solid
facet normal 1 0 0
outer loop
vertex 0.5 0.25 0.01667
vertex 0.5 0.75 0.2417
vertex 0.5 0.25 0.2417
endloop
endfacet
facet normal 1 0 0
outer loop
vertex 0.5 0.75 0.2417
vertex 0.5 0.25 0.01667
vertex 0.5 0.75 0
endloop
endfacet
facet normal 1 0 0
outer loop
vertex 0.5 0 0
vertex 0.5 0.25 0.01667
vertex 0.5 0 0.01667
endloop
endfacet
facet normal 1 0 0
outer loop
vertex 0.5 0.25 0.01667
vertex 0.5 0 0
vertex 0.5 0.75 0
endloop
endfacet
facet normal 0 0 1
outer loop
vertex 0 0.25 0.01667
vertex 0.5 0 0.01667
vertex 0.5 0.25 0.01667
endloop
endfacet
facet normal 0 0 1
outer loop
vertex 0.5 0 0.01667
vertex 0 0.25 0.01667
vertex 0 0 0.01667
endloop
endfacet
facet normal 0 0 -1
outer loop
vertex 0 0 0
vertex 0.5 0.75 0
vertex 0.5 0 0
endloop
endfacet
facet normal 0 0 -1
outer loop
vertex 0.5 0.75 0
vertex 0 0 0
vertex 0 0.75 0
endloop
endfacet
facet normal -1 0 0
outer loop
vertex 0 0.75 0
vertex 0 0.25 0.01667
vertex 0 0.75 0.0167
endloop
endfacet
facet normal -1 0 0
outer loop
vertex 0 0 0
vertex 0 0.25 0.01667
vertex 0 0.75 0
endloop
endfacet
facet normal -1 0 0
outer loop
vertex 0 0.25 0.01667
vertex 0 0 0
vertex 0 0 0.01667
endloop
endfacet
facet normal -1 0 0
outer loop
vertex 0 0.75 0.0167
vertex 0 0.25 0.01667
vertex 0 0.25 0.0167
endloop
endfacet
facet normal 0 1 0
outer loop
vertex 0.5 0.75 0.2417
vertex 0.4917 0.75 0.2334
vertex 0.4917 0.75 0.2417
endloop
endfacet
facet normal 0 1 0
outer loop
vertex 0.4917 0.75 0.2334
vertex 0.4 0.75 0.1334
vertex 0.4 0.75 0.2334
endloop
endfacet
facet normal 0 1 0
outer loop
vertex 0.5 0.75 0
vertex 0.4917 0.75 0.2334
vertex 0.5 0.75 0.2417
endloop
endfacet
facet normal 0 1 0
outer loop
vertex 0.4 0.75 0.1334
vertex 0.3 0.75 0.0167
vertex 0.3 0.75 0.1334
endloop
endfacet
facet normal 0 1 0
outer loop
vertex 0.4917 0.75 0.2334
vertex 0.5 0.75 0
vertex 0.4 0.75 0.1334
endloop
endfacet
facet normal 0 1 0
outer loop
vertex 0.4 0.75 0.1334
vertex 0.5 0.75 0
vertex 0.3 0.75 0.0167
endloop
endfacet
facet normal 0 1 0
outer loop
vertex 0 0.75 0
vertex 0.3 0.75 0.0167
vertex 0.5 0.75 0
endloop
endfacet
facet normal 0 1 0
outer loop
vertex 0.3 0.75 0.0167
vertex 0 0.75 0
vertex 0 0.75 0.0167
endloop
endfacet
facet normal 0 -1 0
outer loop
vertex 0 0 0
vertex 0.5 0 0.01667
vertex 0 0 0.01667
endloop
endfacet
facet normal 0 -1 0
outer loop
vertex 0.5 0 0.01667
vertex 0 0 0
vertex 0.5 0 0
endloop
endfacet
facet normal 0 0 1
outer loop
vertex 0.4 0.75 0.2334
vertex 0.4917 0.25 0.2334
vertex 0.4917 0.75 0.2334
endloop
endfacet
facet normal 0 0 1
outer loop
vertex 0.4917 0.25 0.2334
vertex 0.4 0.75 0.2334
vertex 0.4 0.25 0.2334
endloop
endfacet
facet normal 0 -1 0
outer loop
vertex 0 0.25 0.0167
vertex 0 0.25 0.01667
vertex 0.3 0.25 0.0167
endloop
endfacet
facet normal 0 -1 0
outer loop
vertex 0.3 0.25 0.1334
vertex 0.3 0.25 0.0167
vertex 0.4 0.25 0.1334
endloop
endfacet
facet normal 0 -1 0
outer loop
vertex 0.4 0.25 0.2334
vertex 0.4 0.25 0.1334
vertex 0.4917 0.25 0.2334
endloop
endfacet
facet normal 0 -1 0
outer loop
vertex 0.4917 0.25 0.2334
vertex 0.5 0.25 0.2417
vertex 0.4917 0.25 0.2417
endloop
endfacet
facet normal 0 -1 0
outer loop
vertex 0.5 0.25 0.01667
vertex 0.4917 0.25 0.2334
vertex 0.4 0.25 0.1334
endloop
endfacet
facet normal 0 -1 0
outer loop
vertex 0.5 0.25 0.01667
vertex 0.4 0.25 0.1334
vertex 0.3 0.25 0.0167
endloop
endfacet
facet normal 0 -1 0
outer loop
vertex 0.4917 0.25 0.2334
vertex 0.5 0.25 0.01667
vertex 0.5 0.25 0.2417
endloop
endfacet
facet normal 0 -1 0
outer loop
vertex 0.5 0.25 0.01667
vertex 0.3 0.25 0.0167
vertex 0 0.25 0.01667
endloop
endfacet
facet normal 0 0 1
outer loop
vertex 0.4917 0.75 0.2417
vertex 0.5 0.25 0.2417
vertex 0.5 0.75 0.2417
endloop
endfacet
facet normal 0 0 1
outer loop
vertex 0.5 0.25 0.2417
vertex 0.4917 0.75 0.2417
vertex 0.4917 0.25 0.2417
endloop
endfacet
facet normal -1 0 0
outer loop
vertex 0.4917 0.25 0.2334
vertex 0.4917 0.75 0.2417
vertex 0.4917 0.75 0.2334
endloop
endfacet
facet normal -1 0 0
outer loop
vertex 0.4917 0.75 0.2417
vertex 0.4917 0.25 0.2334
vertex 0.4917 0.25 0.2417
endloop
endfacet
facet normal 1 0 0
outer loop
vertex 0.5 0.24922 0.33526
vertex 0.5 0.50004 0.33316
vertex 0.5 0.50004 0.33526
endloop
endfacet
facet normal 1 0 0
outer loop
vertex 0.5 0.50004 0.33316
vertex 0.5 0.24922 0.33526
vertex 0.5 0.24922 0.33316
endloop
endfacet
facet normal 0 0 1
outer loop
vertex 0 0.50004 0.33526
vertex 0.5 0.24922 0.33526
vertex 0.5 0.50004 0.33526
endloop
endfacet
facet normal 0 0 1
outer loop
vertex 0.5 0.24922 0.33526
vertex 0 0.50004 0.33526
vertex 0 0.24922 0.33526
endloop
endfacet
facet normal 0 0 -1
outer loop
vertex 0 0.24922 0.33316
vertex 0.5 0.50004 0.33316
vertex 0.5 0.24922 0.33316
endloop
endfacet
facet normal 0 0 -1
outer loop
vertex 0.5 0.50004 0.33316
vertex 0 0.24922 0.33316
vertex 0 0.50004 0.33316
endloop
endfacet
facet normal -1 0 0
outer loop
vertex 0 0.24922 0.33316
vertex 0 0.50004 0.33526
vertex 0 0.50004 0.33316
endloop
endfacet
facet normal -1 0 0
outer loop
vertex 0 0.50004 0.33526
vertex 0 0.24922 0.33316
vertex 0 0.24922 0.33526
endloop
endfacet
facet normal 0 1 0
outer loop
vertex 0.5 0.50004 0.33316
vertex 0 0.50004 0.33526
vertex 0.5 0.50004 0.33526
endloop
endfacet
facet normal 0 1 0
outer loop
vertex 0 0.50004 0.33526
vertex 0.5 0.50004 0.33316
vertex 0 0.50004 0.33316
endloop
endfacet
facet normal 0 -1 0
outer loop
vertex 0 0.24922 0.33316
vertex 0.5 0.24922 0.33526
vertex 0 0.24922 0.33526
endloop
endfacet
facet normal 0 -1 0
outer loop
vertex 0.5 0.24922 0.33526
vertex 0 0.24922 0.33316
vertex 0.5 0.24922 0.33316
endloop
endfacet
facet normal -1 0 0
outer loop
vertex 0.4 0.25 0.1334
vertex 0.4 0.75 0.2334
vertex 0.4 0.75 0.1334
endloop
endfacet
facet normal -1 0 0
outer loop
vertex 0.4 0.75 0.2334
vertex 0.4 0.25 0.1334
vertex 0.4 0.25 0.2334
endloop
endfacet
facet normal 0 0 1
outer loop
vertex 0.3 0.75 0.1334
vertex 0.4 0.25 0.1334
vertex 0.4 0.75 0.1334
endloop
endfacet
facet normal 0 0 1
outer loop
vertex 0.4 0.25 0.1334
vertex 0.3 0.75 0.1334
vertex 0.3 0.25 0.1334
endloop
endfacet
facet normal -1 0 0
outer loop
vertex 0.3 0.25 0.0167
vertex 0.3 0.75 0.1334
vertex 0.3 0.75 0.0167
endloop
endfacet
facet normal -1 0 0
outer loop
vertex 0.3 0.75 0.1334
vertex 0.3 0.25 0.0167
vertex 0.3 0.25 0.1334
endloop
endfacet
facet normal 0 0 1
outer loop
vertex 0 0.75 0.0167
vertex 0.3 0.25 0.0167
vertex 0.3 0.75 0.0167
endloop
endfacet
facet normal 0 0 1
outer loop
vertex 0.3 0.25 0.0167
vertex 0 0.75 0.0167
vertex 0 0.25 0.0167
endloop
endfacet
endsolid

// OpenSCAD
// Parameters for Main Reference Slab
base_length = 0.5;
base_width = 0.75;
base_height = 0.016667;

// Parameters for Upper-Side Solid Rectangular Feature
rear_feature_length = 0.5;
rear_feature_width = 0.5;
rear_feature_reach = 0.2334;
rear_feature_offset_y = 0.25;

// Parameters for Upper-Side Narrow Edge Strips
strip_length = 0.0083;
strip_width = 0.5;
strip_depth = 0.0083;

// Parameters for Thin Upper-Side Transverse Solid Feature
transverse_length = 0.5;
transverse_width = 0.250819;
transverse_thickness = 0.0021;
transverse_offset_y = 0.24922;
transverse_reach = 0.335265;

// Parameters for Stepped Void (Internal Profile)
// Note: Widths are approximated as the prompt states they share edges but does not define the unshared boundary
void_shallow_depth = 0.1;
void_shallow_width = 0.4;
void_deep_depth = 0.2167;
void_deep_width = 0.3;

$fn = 100;

module model() {
    difference() {
        union() {
            // 1. Main reference slab
            cube([base_length, base_width, base_height]);
            
            // 2. Upper-side solid rectangular feature
            // Flush to left, right, back. Offset 0.25 from front. Reach 0.2334 from base datum.
            translate([0, rear_feature_offset_y, 0])
                cube([rear_feature_length, rear_feature_width, rear_feature_reach]);
                
            // 3. Two upper-side solid narrow rectangular edge strips
            // Left strip
            translate([0, rear_feature_offset_y, rear_feature_reach])
                cube([strip_length, strip_width, strip_depth]);
                
            // Right strip
            translate([rear_feature_length - strip_length, rear_feature_offset_y, rear_feature_reach])
                cube([strip_length, strip_width, strip_depth]);
                
            // 4. Thin upper-side transverse solid feature
            // Offset 0.24922 from front. Reach 0.335265 from base datum.
            translate([0, transverse_offset_y, transverse_reach - transverse_thickness])
                cube([transverse_length, transverse_width, transverse_thickness]);
        }
        
        // 5. Aligned stepped open void
        // Shallow upper pad void
        translate([-0.01, rear_feature_offset_y - 0.01, rear_feature_reach - void_shallow_depth])
            cube([void_shallow_width + 0.01, rear_feature_width + 0.02, void_shallow_depth + 0.01]);
            
        // Deeper continuation void (shares same shoulder / top face)
        translate([-0.01, rear_feature_offset_y - 0.01, rear_feature_reach - void_deep_depth])
            cube([void_deep_width + 0.01, rear_feature_width + 0.02, void_deep_depth + 0.01]);
    }
}

// Instantiate the final model
model();
